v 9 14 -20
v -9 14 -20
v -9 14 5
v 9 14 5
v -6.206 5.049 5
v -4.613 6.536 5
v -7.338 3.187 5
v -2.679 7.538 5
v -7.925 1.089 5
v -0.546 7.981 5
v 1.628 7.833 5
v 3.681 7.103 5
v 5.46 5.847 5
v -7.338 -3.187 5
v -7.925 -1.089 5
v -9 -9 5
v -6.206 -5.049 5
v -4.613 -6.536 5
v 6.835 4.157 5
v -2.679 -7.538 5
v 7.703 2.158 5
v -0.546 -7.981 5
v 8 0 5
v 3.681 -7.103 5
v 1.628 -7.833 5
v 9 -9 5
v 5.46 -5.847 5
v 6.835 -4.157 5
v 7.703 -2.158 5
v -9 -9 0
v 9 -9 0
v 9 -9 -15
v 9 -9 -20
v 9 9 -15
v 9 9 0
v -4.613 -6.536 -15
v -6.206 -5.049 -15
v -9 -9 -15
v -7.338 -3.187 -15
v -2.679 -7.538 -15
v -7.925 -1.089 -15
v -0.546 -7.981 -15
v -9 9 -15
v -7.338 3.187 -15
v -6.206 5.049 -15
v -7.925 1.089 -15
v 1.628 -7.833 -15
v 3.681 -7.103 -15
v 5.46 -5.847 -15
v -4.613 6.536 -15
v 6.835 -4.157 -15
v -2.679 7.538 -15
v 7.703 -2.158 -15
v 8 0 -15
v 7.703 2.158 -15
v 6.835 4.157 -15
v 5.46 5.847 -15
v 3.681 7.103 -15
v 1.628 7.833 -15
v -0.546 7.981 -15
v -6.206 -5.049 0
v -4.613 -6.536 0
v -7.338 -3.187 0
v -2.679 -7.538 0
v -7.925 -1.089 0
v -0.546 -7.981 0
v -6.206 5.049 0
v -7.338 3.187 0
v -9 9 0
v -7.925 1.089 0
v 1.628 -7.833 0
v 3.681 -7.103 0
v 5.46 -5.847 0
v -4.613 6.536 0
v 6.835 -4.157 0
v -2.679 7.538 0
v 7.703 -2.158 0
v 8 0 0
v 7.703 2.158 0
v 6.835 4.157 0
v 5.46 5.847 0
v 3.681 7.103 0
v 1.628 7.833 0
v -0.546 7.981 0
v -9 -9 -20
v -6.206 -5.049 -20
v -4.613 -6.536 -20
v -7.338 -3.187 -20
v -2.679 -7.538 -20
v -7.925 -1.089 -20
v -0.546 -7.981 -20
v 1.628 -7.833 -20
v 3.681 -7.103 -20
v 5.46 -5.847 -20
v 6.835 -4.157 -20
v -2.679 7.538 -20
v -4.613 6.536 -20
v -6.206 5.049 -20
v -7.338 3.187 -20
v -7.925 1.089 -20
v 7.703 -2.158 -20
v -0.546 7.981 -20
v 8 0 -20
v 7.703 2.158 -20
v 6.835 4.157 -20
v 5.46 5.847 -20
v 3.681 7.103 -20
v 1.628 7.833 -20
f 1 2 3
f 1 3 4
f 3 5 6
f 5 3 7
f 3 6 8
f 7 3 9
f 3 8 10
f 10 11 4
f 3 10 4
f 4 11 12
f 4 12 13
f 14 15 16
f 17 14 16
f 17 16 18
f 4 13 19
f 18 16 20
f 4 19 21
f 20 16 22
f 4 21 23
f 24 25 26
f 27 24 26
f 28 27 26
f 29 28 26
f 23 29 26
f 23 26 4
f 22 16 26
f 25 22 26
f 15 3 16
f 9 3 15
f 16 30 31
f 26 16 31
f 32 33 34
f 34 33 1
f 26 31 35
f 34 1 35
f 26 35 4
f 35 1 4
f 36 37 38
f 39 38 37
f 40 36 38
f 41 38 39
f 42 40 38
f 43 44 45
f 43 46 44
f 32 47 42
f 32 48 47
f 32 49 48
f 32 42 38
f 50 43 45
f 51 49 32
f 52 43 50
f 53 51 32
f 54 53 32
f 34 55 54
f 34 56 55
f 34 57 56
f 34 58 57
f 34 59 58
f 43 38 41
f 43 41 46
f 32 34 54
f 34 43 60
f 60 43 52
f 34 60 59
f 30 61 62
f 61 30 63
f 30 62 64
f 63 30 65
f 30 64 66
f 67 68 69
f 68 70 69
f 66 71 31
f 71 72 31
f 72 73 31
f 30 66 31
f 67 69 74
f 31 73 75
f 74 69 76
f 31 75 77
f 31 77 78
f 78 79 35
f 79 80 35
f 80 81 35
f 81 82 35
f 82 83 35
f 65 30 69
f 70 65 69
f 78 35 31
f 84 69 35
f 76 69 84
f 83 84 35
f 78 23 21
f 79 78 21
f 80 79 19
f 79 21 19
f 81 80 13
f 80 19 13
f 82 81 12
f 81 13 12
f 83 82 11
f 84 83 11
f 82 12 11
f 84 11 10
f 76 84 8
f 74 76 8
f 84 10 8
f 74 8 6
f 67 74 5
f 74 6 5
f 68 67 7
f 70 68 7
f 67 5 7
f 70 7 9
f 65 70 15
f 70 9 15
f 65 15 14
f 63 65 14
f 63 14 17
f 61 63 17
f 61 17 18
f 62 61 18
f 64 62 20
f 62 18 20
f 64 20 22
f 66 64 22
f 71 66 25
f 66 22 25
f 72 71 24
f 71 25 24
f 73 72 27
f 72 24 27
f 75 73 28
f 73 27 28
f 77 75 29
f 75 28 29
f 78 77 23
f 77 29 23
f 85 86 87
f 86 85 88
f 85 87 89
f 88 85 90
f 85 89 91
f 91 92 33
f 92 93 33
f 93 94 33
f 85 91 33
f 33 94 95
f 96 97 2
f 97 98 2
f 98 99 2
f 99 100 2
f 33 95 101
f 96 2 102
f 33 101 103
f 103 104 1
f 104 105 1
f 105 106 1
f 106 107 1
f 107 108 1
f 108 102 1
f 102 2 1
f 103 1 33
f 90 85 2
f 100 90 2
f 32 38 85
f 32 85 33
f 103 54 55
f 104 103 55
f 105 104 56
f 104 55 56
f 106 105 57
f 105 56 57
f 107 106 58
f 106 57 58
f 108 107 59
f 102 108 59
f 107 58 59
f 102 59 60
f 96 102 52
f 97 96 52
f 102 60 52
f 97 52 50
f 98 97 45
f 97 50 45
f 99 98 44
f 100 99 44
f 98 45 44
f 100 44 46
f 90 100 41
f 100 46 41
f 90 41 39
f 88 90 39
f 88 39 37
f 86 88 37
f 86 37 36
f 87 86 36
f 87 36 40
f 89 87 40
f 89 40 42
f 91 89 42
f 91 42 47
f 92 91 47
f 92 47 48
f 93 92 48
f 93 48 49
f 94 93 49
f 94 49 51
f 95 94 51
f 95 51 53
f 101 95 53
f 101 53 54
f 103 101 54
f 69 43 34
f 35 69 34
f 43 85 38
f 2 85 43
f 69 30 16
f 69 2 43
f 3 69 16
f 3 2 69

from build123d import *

# Parameters (mm, degrees)
SKETCH_1_W          = 18
SKETCH_1_H          = 18
EXTRUDE_1_DEPTH     = 5
SKETCH_2_R          = 8
CUT_EXTRUDE_1_DEPTH = 5
SKETCH_3_W          = 18
SKETCH_3_H          = 25
EXTRUDE_2_DEPTH     = 5
SKETCH_4_W          = 18
SKETCH_4_H          = 5
EXTRUDE_3_DEPTH     = 18
SKETCH_5_R          = 8
CUT_EXTRUDE_2_DEPTH = 18


with BuildPart() as part:
    # 草图1 → 凸台-拉伸1 (new body)
    with BuildSketch(Plane.XY):
        Rectangle(SKETCH_1_W, SKETCH_1_H)
    extrude(amount=EXTRUDE_1_DEPTH)

    # 草图2 → 切除-拉伸1 (cut)
    with BuildSketch(Plane.XY.offset(5)):
        Circle(SKETCH_2_R)
    extrude(amount=-CUT_EXTRUDE_1_DEPTH, mode=Mode.SUBTRACT)

    # 草图3 → 凸台-拉伸2 (add)
    with BuildSketch(Plane(origin=(0, 9, 0), x_dir=(1, 0, 0), z_dir=(0, 1, 0))):
        with Locations((0, 7.5)):
            Rectangle(SKETCH_3_W, SKETCH_3_H)
    extrude(amount=EXTRUDE_2_DEPTH)

    # 草图4 → 凸台-拉伸3 (add)
    with BuildSketch(Plane.XZ.offset(-9)):
        with Locations((0, -17.5)):
            Rectangle(SKETCH_4_W, SKETCH_4_H)
    extrude(amount=EXTRUDE_3_DEPTH)

    # 草图5 → 切除-拉伸2 (cut)
    with BuildSketch(Plane.XY.offset(-15)):
        Circle(SKETCH_5_R)
    extrude(amount=-CUT_EXTRUDE_2_DEPTH, mode=Mode.SUBTRACT)


solid = part.part
